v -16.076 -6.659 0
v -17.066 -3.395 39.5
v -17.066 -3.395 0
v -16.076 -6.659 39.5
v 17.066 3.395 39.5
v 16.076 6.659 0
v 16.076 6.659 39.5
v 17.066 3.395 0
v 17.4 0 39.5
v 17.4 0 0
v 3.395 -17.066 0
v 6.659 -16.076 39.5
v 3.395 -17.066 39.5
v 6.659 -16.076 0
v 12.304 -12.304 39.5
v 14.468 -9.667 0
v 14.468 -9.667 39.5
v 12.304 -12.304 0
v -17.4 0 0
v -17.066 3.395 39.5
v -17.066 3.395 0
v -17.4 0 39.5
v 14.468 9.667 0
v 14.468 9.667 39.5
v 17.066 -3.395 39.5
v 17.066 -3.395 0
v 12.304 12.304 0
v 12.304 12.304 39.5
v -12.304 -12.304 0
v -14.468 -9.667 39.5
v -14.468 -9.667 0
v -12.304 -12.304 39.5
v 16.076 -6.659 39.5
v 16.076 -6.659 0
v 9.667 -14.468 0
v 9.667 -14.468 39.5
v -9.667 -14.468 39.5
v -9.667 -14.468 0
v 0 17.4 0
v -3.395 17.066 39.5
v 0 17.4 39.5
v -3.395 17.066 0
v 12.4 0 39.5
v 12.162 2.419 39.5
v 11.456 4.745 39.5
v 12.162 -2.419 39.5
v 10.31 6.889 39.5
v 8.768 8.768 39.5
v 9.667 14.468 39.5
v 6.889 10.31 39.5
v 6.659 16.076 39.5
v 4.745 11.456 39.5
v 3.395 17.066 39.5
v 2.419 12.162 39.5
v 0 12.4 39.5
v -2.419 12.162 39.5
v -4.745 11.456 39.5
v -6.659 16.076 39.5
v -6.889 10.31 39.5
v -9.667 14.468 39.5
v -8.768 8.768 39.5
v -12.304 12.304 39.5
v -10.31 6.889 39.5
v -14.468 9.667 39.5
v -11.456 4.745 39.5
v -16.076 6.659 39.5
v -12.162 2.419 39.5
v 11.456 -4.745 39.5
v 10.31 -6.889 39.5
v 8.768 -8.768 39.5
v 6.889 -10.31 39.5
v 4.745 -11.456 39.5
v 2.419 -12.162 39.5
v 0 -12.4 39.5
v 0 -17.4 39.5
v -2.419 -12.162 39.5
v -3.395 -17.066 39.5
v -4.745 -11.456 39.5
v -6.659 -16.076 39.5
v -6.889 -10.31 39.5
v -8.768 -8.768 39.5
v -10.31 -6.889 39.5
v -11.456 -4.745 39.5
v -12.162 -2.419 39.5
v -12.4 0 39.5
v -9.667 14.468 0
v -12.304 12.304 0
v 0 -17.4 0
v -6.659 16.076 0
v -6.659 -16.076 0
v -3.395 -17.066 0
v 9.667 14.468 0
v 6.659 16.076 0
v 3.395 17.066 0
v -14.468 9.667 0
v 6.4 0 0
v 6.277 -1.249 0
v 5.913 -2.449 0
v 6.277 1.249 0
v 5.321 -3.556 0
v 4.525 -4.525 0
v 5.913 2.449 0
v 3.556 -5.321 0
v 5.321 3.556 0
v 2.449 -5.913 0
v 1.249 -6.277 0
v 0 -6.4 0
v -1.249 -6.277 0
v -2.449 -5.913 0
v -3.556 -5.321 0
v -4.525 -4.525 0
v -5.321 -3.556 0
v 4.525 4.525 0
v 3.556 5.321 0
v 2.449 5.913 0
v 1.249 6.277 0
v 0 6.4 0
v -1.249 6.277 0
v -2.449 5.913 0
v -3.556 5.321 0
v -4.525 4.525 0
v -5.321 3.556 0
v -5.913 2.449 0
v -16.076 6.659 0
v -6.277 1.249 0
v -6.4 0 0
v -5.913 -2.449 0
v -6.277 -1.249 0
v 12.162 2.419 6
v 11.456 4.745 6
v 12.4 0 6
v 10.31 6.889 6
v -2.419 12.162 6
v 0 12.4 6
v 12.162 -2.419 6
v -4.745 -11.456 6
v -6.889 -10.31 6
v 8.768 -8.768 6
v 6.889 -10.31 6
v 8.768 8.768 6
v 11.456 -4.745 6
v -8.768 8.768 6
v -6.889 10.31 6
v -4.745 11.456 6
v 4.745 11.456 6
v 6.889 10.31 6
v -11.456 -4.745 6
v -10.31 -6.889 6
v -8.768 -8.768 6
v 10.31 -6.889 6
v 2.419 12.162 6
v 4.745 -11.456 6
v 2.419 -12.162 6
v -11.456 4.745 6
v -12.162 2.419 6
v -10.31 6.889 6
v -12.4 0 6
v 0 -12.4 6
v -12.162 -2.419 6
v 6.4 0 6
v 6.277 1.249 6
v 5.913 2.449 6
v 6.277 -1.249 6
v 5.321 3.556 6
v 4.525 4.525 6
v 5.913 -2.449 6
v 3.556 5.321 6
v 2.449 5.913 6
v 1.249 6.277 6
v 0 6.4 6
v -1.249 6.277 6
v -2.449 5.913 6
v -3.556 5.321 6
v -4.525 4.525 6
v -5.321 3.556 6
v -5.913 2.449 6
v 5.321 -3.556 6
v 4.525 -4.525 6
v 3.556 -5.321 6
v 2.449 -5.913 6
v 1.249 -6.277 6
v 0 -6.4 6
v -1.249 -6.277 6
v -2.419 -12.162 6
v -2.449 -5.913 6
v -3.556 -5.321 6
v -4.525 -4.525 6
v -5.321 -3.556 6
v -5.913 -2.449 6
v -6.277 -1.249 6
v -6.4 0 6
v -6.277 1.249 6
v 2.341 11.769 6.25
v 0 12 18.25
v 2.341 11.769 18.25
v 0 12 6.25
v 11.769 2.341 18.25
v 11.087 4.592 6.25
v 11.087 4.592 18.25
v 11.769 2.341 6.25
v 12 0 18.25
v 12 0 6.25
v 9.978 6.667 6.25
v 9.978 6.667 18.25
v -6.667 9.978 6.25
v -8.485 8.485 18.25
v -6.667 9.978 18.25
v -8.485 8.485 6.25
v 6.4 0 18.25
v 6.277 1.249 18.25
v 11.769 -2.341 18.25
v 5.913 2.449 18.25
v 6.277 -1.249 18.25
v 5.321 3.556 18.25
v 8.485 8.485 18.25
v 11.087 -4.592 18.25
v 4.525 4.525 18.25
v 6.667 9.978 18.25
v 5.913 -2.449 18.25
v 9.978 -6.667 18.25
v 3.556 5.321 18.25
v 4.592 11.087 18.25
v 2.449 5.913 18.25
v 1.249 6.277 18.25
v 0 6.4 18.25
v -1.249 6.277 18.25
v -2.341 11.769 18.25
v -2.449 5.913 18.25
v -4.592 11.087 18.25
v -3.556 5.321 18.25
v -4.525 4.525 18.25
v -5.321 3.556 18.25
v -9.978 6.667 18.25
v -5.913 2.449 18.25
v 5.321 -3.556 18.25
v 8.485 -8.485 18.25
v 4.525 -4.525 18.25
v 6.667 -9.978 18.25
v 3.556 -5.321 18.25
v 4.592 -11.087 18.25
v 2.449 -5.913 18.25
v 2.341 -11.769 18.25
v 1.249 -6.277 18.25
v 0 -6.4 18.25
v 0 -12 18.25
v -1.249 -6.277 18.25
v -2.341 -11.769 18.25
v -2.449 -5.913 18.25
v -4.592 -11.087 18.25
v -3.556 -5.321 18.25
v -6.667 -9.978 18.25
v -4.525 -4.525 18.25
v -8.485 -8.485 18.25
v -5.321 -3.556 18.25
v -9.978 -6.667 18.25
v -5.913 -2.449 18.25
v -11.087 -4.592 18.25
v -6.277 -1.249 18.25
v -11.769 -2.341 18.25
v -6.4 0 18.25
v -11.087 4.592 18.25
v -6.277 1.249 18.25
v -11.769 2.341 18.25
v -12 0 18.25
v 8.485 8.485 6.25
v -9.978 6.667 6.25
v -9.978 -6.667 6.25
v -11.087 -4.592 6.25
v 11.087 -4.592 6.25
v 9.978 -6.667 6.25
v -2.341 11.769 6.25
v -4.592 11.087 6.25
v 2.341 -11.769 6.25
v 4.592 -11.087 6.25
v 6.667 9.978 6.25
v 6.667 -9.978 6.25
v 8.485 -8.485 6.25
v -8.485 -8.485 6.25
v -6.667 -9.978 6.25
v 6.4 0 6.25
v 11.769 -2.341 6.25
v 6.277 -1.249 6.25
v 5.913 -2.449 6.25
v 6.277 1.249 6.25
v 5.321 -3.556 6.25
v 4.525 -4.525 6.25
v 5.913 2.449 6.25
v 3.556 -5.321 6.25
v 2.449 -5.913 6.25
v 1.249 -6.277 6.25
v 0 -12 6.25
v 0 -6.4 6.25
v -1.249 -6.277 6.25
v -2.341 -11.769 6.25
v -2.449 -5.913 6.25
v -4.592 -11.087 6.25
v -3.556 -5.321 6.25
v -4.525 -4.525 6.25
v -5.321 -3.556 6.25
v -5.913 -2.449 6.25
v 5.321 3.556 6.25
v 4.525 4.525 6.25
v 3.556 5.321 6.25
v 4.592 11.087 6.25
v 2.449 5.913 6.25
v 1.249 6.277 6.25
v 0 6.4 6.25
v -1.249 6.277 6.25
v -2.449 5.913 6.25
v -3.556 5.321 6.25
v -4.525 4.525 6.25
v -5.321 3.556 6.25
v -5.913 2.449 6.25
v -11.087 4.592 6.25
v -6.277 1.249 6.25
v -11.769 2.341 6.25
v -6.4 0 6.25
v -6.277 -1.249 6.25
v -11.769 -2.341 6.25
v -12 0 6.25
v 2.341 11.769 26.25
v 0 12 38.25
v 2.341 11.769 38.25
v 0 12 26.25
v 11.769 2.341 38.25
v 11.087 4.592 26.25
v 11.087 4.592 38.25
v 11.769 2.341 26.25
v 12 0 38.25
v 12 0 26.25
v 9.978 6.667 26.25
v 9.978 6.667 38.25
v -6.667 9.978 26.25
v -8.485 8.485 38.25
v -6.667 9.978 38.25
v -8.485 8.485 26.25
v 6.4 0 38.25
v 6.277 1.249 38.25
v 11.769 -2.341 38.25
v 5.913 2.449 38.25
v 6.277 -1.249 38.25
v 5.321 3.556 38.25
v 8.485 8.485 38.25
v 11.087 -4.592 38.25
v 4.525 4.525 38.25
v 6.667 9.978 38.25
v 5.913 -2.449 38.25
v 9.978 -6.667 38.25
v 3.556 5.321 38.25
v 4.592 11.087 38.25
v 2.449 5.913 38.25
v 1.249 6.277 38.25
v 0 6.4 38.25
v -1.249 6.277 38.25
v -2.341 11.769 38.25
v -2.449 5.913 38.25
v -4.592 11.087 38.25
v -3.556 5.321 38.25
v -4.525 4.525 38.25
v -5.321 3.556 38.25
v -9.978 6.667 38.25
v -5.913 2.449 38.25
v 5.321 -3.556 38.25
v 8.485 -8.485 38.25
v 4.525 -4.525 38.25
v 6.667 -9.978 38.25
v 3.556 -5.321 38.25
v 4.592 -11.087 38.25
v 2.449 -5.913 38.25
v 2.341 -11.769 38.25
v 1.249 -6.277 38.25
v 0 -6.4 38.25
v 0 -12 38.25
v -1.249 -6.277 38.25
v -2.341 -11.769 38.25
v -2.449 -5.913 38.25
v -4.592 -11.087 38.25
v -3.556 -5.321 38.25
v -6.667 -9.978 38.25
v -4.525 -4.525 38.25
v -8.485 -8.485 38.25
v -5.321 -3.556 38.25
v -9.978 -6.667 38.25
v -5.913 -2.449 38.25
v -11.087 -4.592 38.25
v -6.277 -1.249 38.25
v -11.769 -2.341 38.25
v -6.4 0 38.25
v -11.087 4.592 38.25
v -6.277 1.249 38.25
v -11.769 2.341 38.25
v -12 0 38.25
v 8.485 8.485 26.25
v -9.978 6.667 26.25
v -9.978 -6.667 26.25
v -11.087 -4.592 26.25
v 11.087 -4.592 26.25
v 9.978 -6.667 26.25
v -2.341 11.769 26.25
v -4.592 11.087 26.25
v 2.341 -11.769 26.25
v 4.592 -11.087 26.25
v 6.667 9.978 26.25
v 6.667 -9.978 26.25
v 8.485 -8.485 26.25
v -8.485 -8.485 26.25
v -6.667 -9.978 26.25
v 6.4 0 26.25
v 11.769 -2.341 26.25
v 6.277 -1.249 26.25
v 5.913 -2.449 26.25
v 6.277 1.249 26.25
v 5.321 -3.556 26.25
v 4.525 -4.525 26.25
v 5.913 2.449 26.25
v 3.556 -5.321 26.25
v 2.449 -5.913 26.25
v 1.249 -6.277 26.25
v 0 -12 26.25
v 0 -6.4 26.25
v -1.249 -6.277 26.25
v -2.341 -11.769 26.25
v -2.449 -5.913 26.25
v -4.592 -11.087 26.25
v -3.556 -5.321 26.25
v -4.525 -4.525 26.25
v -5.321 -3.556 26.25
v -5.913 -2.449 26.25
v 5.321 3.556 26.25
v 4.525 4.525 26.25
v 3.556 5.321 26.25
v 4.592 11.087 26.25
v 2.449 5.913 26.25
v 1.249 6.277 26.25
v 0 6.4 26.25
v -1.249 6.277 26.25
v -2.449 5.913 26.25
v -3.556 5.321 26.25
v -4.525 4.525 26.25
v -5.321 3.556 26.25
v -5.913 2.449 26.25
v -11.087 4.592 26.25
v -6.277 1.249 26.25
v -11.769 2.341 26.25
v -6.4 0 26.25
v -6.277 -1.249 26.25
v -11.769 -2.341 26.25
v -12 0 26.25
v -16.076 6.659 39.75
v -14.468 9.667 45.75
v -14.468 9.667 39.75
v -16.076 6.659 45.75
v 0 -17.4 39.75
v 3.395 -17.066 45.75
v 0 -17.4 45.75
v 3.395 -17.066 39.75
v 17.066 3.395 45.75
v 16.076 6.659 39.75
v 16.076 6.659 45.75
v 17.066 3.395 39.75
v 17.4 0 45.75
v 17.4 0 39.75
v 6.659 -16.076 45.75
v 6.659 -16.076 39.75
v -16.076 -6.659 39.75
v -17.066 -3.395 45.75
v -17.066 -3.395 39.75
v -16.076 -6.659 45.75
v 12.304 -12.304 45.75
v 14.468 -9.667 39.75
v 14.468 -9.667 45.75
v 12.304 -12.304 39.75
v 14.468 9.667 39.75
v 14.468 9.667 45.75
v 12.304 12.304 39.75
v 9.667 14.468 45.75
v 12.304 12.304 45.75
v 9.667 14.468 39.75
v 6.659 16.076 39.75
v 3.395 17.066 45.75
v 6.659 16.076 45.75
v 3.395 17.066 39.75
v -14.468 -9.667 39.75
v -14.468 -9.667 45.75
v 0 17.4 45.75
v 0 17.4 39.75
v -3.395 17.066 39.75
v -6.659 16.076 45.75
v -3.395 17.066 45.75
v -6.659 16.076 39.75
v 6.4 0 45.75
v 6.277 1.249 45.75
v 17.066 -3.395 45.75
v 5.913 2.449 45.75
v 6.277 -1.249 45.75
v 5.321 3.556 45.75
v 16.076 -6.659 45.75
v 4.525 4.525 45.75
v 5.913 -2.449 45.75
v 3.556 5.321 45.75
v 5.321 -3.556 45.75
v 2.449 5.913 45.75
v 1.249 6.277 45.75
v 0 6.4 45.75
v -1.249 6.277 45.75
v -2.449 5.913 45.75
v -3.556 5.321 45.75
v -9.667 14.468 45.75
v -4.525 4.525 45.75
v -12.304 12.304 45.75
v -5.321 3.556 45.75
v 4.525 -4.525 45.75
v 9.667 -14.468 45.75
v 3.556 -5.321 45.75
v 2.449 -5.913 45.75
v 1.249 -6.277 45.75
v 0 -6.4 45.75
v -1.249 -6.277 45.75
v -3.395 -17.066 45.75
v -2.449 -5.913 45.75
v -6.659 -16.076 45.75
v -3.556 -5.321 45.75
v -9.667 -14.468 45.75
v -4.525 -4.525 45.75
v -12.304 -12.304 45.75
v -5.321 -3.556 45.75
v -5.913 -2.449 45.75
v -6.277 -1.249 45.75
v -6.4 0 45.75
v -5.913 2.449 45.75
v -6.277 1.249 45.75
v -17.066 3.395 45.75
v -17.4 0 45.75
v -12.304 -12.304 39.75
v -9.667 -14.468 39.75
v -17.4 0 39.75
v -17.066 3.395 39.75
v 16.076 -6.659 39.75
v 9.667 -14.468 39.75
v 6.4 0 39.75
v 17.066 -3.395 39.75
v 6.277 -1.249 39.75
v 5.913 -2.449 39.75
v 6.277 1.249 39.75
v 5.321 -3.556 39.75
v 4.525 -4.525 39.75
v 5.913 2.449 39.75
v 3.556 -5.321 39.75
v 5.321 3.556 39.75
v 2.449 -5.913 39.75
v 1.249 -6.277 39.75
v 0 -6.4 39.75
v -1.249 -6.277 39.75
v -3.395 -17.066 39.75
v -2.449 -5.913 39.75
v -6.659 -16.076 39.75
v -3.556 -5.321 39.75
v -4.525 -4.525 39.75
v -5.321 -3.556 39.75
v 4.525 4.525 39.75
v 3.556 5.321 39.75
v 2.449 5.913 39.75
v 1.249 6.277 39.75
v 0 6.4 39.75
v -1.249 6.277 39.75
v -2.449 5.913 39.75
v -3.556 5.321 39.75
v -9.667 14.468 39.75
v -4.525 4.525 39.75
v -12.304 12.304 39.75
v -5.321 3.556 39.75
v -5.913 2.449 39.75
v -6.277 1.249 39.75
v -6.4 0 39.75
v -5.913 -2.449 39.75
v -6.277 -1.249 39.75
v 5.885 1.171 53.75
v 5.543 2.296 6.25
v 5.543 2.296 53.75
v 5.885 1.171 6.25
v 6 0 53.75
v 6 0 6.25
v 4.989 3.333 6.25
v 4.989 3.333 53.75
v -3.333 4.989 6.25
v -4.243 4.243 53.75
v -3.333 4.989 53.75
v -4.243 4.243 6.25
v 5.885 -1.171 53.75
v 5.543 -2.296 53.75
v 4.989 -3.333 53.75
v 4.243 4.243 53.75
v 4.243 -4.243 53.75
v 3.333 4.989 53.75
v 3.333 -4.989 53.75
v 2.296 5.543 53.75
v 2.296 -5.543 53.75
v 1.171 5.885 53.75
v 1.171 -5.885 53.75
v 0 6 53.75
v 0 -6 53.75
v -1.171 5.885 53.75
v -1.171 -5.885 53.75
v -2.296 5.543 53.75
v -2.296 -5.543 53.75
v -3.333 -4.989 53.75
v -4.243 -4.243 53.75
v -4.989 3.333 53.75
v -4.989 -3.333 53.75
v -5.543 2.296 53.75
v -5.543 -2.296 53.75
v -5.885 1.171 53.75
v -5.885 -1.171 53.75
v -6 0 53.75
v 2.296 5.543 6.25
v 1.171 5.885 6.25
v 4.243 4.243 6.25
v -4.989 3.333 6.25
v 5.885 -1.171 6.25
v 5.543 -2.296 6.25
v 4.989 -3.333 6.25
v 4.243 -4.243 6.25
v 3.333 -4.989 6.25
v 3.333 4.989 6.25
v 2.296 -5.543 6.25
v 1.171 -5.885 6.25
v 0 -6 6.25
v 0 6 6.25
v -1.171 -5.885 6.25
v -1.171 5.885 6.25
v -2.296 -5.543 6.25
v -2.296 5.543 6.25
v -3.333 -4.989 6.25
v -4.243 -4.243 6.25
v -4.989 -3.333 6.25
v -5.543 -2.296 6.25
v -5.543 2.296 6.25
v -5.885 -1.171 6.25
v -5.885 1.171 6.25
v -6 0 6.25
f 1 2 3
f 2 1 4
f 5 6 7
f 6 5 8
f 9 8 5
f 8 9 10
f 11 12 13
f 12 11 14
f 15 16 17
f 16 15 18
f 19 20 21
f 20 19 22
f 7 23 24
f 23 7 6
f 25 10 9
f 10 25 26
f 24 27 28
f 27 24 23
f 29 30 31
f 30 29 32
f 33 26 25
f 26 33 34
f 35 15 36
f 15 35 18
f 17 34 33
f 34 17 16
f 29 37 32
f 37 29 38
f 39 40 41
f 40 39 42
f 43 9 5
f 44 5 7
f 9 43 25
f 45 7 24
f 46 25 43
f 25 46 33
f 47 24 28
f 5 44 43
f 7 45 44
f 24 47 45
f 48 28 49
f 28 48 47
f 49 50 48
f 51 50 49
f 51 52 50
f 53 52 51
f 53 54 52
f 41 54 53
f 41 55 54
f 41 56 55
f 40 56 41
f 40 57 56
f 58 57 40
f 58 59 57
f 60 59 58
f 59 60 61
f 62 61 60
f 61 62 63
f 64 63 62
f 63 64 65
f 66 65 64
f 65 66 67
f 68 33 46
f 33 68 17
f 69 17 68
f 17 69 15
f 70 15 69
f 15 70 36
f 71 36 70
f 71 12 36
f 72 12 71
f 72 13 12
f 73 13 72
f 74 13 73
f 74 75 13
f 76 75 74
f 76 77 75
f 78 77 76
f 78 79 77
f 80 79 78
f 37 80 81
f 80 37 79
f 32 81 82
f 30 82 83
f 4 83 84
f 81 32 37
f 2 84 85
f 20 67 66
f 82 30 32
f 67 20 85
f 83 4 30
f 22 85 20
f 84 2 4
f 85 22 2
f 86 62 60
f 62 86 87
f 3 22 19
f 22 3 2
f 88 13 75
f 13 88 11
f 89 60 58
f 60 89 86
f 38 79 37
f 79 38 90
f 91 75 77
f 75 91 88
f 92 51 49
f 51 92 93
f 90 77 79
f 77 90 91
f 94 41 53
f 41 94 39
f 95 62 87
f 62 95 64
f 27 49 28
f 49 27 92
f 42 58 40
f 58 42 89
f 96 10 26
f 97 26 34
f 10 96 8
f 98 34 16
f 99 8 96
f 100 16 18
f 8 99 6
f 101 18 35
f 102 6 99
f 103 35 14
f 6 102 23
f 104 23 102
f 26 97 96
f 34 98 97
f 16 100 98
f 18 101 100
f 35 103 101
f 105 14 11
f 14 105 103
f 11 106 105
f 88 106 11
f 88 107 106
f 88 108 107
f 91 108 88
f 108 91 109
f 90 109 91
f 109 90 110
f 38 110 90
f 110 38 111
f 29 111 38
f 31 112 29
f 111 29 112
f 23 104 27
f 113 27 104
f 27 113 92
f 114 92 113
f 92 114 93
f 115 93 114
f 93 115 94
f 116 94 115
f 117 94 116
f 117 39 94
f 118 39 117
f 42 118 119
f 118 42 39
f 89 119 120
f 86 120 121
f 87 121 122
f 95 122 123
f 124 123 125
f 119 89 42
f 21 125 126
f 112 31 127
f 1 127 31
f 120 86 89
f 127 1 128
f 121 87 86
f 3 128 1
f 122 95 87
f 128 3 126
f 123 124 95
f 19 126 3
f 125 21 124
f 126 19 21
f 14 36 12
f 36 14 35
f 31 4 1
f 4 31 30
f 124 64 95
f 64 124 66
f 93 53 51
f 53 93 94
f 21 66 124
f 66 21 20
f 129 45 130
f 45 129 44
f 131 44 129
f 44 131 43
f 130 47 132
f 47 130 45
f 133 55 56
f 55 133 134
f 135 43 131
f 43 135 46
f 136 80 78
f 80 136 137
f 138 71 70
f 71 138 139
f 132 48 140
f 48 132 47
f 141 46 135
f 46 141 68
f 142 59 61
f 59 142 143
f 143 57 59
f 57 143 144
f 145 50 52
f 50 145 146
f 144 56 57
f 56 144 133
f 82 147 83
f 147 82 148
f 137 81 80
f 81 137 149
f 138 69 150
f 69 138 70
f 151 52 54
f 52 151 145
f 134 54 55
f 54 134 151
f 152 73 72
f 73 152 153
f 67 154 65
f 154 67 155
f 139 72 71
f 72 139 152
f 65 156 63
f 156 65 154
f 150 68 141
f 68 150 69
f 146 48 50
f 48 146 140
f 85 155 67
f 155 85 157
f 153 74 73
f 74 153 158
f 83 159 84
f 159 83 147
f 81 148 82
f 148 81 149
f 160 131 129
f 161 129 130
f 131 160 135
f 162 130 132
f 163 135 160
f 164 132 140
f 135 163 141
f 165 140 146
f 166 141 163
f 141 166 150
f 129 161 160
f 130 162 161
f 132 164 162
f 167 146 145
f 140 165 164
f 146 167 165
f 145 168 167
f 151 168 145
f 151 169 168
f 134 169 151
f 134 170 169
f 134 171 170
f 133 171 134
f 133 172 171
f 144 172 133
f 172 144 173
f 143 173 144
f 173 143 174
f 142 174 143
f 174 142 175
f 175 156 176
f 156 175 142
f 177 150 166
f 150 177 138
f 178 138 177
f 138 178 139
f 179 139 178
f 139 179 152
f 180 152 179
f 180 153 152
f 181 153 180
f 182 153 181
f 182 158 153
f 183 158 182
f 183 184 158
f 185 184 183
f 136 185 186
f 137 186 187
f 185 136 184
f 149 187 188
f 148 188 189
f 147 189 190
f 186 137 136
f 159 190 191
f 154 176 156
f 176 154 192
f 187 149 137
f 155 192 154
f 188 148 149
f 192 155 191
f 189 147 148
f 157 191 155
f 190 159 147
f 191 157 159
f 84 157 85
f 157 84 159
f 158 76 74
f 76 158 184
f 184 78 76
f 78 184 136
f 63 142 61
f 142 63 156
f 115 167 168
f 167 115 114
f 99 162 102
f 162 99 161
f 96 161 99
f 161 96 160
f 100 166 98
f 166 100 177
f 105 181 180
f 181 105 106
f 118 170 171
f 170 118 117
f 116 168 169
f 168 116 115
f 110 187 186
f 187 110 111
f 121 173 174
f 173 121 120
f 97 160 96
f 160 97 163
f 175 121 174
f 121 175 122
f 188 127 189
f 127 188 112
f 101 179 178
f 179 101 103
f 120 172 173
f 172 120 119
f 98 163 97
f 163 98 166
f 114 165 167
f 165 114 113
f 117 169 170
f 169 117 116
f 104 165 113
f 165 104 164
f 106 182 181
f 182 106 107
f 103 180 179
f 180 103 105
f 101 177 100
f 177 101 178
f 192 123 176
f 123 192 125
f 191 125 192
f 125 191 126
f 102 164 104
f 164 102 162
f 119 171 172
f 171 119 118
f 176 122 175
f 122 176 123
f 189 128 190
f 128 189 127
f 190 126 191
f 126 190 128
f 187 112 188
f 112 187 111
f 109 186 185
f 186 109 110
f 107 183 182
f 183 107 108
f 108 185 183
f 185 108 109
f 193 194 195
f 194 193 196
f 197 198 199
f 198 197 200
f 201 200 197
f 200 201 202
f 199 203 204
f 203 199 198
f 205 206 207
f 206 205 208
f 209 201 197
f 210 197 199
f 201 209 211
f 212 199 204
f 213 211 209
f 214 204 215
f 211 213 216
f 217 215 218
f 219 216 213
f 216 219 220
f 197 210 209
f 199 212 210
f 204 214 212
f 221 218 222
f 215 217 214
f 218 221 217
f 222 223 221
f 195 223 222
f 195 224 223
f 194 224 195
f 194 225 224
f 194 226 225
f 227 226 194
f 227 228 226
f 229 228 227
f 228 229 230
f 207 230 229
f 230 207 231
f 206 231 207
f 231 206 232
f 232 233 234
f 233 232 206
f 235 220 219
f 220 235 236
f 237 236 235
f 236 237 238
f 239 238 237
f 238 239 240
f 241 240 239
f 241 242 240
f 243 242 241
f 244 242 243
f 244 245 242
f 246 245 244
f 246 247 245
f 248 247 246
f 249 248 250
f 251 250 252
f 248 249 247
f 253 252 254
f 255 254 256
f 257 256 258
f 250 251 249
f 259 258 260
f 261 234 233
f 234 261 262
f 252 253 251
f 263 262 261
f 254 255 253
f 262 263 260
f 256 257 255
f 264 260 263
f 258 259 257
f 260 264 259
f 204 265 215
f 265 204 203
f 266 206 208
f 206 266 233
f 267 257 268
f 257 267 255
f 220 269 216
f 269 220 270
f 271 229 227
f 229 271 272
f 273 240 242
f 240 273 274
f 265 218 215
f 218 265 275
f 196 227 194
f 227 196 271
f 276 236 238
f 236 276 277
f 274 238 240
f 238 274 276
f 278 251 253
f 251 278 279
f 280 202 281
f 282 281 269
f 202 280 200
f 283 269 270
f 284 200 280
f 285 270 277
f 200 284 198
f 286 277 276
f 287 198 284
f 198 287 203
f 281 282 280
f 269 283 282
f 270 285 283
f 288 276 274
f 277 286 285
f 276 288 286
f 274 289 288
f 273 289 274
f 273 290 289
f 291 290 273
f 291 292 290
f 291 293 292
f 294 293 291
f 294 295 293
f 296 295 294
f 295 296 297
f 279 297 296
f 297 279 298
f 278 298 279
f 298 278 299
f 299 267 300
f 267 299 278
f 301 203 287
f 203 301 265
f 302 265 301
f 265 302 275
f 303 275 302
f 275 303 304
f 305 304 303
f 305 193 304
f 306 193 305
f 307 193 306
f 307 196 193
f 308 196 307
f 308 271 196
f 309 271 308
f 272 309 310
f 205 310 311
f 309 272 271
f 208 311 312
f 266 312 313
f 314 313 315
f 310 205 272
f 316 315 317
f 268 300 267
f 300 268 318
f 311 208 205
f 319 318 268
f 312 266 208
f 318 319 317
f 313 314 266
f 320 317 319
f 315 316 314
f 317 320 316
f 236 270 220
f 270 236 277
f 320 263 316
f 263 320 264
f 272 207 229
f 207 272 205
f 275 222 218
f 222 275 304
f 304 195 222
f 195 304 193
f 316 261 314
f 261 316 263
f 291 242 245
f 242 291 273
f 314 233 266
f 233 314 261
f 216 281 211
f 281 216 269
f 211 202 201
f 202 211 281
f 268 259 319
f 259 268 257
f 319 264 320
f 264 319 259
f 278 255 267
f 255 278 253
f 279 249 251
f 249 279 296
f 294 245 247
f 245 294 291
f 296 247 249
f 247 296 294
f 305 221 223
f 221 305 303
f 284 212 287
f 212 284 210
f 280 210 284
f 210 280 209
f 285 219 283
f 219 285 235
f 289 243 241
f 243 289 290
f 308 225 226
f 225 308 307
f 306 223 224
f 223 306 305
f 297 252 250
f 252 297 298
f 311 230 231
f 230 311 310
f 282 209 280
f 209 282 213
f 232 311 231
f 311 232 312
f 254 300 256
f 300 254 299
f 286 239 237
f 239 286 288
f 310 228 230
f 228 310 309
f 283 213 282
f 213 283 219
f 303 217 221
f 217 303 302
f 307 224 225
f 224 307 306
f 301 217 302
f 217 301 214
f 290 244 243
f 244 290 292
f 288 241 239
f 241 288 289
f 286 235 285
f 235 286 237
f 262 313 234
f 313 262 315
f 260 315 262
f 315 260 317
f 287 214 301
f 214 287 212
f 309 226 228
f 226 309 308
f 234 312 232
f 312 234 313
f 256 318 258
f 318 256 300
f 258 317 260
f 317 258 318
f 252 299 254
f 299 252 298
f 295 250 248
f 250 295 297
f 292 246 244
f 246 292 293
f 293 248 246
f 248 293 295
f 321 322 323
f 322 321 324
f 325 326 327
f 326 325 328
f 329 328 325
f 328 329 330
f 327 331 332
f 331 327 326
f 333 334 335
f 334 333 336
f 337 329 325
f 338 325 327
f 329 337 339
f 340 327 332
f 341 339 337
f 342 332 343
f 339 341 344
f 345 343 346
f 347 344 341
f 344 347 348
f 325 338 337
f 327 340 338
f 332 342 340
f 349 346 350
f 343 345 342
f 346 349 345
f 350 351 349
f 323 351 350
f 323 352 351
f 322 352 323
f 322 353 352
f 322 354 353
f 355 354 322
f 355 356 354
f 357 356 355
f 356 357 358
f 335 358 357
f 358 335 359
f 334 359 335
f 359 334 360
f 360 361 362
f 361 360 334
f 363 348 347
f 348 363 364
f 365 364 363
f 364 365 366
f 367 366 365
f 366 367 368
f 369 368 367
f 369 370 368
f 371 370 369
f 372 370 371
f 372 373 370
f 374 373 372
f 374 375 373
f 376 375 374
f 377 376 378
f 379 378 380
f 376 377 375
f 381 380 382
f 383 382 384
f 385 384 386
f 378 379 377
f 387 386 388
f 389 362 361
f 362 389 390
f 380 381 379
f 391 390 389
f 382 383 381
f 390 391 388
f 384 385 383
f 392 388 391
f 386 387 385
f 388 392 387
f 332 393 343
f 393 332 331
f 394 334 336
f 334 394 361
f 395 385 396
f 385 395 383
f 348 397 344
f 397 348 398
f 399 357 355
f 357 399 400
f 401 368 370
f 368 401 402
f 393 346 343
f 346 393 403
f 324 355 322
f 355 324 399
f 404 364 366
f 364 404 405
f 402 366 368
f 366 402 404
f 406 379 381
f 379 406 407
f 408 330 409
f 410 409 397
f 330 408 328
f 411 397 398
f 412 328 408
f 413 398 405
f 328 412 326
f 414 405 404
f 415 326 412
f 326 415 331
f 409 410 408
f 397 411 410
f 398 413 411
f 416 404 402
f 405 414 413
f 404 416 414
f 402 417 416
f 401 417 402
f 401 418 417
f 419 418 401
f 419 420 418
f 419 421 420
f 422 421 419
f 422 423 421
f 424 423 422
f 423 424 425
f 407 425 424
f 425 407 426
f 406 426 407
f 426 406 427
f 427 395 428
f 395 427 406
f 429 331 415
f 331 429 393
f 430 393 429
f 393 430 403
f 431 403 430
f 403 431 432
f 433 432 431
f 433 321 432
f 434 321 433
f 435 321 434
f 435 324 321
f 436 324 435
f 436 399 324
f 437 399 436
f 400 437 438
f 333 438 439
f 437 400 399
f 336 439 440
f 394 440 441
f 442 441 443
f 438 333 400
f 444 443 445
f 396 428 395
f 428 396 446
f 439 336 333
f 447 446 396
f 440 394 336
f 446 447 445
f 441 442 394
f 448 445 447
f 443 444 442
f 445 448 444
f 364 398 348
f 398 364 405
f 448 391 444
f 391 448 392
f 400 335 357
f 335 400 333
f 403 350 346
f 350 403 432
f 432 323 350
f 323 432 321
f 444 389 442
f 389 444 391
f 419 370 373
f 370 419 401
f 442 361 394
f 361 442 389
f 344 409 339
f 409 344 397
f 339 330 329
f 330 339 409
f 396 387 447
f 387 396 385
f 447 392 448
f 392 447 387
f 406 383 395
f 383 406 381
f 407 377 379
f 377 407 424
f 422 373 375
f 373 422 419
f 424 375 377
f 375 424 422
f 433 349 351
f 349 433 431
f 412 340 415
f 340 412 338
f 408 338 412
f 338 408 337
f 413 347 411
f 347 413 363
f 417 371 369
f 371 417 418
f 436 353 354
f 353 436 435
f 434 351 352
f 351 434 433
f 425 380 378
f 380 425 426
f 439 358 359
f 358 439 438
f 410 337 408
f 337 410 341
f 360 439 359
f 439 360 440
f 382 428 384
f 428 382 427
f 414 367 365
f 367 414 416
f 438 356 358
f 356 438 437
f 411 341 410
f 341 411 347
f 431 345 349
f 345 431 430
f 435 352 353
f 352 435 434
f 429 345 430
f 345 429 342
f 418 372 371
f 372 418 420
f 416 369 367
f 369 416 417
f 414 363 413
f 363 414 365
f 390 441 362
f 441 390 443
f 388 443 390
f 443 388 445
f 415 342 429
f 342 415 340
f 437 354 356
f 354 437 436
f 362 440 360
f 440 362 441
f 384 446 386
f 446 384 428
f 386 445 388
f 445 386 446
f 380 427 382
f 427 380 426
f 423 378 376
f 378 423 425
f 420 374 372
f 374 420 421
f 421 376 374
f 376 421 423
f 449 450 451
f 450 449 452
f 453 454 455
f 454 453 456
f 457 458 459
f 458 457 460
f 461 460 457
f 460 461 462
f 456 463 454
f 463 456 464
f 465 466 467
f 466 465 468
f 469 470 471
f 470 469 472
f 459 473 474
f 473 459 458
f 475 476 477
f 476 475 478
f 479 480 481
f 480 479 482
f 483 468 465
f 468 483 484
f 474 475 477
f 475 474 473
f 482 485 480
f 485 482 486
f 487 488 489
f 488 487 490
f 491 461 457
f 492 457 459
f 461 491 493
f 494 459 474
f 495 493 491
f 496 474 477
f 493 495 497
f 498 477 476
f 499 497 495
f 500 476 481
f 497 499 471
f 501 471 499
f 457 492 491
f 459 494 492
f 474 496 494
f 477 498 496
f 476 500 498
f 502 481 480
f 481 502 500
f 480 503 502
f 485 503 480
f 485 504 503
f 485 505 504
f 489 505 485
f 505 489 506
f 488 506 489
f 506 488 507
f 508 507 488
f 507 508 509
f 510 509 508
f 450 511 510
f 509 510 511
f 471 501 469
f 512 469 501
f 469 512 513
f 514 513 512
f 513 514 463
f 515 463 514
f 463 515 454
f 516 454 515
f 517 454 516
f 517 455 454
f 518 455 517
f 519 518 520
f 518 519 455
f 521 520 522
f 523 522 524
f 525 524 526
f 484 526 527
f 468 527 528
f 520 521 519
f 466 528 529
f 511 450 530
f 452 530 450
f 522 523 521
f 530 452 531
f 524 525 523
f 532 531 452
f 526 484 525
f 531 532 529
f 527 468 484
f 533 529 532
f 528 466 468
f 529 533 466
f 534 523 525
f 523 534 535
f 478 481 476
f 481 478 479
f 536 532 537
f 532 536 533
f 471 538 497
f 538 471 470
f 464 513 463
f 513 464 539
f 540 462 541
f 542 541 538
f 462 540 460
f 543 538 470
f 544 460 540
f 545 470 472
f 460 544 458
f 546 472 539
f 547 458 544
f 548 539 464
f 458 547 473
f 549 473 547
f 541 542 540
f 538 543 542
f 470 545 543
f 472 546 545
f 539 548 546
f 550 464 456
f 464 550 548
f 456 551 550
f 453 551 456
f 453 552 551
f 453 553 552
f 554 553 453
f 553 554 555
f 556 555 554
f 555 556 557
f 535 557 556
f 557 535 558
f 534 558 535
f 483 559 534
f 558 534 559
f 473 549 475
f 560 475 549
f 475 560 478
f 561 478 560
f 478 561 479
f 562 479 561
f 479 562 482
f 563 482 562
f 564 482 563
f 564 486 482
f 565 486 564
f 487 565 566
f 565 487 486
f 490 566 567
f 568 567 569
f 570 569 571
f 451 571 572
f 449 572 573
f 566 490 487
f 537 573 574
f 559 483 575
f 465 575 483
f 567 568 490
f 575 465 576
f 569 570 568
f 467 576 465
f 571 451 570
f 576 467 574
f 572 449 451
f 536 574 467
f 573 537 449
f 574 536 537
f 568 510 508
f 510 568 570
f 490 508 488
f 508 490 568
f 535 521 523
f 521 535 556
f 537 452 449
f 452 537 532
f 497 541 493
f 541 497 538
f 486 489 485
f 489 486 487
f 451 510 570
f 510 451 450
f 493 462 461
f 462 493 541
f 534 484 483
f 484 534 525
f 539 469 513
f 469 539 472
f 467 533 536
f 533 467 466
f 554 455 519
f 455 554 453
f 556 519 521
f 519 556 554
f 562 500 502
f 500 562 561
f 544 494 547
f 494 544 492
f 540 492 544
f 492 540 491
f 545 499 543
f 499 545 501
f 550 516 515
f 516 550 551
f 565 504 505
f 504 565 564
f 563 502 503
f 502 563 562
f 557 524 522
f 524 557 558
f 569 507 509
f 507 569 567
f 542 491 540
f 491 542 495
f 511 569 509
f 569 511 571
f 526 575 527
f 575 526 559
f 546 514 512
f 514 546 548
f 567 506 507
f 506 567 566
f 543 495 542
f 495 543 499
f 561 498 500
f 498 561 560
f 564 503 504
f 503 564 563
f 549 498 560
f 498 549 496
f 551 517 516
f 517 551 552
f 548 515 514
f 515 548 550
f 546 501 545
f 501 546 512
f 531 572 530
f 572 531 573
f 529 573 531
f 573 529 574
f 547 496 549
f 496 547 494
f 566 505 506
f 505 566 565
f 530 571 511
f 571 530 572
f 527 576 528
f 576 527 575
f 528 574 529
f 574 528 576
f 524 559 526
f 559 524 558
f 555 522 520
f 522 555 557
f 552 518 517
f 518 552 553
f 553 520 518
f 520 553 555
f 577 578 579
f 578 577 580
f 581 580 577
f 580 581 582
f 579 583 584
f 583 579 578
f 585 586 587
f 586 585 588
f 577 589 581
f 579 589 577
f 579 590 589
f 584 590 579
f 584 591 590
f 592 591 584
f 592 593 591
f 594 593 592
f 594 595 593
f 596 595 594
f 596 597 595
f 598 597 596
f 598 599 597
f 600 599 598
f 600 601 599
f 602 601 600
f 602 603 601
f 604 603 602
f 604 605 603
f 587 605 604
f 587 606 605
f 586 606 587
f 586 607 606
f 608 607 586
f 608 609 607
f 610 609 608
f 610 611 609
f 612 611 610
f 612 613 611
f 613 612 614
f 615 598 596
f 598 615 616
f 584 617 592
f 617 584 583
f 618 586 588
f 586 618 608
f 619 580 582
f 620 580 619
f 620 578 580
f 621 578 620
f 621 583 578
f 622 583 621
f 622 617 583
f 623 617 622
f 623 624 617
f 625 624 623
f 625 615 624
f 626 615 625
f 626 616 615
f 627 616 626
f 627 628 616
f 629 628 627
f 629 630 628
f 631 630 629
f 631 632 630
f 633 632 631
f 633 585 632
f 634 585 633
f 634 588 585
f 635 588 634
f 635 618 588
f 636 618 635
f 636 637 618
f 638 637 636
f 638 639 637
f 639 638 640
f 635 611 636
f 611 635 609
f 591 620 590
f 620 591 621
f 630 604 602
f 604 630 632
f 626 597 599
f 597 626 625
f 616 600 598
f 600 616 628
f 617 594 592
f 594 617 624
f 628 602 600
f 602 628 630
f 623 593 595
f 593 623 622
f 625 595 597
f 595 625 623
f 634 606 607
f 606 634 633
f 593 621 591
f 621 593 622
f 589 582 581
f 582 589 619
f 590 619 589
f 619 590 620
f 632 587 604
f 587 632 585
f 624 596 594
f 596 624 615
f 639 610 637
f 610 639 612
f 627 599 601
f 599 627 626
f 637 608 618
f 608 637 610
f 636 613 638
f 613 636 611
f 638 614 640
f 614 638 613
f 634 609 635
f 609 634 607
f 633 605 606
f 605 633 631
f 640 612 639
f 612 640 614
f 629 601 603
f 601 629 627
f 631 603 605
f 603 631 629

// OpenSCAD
$fn = 32;

// ------------------------------------------------------------------------
// Shaft station: cup d34.8 x 39.5 mm, shaft d12
// Every part is its own module, assembly() places every instance.
// ------------------------------------------------------------------------

// --- part 1 ---
module housing_cup() {
  difference() {
    cylinder(h = 39.5, d = 34.8);
    translate([0, 0, 6]) cylinder(h = 34.5, d = 24.8);
    translate([0, 0, -1]) cylinder(h = 8, d = 12.8);
  }
}

// --- part 2 ---
module bearing_lower() {
  difference() {
      translate([0, 0, 0]) cylinder(h = 12, d = 24);
      translate([0, 0, -1]) cylinder(h = 14, d = 12.8);
    }
}

// --- part 3 ---
module bearing_upper() {
  difference() {
      translate([0, 0, 0]) cylinder(h = 12, d = 24);
      translate([0, 0, -1]) cylinder(h = 14, d = 12.8);
    }
}

// --- part 4 ---
module station_shaft() {
  translate([0, 0, -23.75]) cylinder(h = 47.5, d = 12);
}

// --- part 5 ---
module station_cover() {
  difference() {
    cylinder(h = 6, d = 34.8);
    translate([0, 0, -1]) cylinder(h = 8, d = 12.8);
  }
}

// --- assembly ---
module assembly() {
  color([0.80, 0.24, 0.20]) translate([0, 0, 0]) rotate([0, 0, 0]) housing_cup();
  color([0.20, 0.45, 0.75]) translate([0, 0, 6.25]) rotate([0, 0, 0]) bearing_lower();
  color([0.25, 0.62, 0.32]) translate([0, 0, 26.25]) rotate([0, 0, 0]) bearing_upper();
  color([0.92, 0.70, 0.18]) translate([0, 0, 30]) rotate([0, 0, 0]) station_shaft();
  color([0.58, 0.35, 0.70]) translate([0, 0, 39.75]) rotate([0, 0, 0]) station_cover();
}

assembly();
